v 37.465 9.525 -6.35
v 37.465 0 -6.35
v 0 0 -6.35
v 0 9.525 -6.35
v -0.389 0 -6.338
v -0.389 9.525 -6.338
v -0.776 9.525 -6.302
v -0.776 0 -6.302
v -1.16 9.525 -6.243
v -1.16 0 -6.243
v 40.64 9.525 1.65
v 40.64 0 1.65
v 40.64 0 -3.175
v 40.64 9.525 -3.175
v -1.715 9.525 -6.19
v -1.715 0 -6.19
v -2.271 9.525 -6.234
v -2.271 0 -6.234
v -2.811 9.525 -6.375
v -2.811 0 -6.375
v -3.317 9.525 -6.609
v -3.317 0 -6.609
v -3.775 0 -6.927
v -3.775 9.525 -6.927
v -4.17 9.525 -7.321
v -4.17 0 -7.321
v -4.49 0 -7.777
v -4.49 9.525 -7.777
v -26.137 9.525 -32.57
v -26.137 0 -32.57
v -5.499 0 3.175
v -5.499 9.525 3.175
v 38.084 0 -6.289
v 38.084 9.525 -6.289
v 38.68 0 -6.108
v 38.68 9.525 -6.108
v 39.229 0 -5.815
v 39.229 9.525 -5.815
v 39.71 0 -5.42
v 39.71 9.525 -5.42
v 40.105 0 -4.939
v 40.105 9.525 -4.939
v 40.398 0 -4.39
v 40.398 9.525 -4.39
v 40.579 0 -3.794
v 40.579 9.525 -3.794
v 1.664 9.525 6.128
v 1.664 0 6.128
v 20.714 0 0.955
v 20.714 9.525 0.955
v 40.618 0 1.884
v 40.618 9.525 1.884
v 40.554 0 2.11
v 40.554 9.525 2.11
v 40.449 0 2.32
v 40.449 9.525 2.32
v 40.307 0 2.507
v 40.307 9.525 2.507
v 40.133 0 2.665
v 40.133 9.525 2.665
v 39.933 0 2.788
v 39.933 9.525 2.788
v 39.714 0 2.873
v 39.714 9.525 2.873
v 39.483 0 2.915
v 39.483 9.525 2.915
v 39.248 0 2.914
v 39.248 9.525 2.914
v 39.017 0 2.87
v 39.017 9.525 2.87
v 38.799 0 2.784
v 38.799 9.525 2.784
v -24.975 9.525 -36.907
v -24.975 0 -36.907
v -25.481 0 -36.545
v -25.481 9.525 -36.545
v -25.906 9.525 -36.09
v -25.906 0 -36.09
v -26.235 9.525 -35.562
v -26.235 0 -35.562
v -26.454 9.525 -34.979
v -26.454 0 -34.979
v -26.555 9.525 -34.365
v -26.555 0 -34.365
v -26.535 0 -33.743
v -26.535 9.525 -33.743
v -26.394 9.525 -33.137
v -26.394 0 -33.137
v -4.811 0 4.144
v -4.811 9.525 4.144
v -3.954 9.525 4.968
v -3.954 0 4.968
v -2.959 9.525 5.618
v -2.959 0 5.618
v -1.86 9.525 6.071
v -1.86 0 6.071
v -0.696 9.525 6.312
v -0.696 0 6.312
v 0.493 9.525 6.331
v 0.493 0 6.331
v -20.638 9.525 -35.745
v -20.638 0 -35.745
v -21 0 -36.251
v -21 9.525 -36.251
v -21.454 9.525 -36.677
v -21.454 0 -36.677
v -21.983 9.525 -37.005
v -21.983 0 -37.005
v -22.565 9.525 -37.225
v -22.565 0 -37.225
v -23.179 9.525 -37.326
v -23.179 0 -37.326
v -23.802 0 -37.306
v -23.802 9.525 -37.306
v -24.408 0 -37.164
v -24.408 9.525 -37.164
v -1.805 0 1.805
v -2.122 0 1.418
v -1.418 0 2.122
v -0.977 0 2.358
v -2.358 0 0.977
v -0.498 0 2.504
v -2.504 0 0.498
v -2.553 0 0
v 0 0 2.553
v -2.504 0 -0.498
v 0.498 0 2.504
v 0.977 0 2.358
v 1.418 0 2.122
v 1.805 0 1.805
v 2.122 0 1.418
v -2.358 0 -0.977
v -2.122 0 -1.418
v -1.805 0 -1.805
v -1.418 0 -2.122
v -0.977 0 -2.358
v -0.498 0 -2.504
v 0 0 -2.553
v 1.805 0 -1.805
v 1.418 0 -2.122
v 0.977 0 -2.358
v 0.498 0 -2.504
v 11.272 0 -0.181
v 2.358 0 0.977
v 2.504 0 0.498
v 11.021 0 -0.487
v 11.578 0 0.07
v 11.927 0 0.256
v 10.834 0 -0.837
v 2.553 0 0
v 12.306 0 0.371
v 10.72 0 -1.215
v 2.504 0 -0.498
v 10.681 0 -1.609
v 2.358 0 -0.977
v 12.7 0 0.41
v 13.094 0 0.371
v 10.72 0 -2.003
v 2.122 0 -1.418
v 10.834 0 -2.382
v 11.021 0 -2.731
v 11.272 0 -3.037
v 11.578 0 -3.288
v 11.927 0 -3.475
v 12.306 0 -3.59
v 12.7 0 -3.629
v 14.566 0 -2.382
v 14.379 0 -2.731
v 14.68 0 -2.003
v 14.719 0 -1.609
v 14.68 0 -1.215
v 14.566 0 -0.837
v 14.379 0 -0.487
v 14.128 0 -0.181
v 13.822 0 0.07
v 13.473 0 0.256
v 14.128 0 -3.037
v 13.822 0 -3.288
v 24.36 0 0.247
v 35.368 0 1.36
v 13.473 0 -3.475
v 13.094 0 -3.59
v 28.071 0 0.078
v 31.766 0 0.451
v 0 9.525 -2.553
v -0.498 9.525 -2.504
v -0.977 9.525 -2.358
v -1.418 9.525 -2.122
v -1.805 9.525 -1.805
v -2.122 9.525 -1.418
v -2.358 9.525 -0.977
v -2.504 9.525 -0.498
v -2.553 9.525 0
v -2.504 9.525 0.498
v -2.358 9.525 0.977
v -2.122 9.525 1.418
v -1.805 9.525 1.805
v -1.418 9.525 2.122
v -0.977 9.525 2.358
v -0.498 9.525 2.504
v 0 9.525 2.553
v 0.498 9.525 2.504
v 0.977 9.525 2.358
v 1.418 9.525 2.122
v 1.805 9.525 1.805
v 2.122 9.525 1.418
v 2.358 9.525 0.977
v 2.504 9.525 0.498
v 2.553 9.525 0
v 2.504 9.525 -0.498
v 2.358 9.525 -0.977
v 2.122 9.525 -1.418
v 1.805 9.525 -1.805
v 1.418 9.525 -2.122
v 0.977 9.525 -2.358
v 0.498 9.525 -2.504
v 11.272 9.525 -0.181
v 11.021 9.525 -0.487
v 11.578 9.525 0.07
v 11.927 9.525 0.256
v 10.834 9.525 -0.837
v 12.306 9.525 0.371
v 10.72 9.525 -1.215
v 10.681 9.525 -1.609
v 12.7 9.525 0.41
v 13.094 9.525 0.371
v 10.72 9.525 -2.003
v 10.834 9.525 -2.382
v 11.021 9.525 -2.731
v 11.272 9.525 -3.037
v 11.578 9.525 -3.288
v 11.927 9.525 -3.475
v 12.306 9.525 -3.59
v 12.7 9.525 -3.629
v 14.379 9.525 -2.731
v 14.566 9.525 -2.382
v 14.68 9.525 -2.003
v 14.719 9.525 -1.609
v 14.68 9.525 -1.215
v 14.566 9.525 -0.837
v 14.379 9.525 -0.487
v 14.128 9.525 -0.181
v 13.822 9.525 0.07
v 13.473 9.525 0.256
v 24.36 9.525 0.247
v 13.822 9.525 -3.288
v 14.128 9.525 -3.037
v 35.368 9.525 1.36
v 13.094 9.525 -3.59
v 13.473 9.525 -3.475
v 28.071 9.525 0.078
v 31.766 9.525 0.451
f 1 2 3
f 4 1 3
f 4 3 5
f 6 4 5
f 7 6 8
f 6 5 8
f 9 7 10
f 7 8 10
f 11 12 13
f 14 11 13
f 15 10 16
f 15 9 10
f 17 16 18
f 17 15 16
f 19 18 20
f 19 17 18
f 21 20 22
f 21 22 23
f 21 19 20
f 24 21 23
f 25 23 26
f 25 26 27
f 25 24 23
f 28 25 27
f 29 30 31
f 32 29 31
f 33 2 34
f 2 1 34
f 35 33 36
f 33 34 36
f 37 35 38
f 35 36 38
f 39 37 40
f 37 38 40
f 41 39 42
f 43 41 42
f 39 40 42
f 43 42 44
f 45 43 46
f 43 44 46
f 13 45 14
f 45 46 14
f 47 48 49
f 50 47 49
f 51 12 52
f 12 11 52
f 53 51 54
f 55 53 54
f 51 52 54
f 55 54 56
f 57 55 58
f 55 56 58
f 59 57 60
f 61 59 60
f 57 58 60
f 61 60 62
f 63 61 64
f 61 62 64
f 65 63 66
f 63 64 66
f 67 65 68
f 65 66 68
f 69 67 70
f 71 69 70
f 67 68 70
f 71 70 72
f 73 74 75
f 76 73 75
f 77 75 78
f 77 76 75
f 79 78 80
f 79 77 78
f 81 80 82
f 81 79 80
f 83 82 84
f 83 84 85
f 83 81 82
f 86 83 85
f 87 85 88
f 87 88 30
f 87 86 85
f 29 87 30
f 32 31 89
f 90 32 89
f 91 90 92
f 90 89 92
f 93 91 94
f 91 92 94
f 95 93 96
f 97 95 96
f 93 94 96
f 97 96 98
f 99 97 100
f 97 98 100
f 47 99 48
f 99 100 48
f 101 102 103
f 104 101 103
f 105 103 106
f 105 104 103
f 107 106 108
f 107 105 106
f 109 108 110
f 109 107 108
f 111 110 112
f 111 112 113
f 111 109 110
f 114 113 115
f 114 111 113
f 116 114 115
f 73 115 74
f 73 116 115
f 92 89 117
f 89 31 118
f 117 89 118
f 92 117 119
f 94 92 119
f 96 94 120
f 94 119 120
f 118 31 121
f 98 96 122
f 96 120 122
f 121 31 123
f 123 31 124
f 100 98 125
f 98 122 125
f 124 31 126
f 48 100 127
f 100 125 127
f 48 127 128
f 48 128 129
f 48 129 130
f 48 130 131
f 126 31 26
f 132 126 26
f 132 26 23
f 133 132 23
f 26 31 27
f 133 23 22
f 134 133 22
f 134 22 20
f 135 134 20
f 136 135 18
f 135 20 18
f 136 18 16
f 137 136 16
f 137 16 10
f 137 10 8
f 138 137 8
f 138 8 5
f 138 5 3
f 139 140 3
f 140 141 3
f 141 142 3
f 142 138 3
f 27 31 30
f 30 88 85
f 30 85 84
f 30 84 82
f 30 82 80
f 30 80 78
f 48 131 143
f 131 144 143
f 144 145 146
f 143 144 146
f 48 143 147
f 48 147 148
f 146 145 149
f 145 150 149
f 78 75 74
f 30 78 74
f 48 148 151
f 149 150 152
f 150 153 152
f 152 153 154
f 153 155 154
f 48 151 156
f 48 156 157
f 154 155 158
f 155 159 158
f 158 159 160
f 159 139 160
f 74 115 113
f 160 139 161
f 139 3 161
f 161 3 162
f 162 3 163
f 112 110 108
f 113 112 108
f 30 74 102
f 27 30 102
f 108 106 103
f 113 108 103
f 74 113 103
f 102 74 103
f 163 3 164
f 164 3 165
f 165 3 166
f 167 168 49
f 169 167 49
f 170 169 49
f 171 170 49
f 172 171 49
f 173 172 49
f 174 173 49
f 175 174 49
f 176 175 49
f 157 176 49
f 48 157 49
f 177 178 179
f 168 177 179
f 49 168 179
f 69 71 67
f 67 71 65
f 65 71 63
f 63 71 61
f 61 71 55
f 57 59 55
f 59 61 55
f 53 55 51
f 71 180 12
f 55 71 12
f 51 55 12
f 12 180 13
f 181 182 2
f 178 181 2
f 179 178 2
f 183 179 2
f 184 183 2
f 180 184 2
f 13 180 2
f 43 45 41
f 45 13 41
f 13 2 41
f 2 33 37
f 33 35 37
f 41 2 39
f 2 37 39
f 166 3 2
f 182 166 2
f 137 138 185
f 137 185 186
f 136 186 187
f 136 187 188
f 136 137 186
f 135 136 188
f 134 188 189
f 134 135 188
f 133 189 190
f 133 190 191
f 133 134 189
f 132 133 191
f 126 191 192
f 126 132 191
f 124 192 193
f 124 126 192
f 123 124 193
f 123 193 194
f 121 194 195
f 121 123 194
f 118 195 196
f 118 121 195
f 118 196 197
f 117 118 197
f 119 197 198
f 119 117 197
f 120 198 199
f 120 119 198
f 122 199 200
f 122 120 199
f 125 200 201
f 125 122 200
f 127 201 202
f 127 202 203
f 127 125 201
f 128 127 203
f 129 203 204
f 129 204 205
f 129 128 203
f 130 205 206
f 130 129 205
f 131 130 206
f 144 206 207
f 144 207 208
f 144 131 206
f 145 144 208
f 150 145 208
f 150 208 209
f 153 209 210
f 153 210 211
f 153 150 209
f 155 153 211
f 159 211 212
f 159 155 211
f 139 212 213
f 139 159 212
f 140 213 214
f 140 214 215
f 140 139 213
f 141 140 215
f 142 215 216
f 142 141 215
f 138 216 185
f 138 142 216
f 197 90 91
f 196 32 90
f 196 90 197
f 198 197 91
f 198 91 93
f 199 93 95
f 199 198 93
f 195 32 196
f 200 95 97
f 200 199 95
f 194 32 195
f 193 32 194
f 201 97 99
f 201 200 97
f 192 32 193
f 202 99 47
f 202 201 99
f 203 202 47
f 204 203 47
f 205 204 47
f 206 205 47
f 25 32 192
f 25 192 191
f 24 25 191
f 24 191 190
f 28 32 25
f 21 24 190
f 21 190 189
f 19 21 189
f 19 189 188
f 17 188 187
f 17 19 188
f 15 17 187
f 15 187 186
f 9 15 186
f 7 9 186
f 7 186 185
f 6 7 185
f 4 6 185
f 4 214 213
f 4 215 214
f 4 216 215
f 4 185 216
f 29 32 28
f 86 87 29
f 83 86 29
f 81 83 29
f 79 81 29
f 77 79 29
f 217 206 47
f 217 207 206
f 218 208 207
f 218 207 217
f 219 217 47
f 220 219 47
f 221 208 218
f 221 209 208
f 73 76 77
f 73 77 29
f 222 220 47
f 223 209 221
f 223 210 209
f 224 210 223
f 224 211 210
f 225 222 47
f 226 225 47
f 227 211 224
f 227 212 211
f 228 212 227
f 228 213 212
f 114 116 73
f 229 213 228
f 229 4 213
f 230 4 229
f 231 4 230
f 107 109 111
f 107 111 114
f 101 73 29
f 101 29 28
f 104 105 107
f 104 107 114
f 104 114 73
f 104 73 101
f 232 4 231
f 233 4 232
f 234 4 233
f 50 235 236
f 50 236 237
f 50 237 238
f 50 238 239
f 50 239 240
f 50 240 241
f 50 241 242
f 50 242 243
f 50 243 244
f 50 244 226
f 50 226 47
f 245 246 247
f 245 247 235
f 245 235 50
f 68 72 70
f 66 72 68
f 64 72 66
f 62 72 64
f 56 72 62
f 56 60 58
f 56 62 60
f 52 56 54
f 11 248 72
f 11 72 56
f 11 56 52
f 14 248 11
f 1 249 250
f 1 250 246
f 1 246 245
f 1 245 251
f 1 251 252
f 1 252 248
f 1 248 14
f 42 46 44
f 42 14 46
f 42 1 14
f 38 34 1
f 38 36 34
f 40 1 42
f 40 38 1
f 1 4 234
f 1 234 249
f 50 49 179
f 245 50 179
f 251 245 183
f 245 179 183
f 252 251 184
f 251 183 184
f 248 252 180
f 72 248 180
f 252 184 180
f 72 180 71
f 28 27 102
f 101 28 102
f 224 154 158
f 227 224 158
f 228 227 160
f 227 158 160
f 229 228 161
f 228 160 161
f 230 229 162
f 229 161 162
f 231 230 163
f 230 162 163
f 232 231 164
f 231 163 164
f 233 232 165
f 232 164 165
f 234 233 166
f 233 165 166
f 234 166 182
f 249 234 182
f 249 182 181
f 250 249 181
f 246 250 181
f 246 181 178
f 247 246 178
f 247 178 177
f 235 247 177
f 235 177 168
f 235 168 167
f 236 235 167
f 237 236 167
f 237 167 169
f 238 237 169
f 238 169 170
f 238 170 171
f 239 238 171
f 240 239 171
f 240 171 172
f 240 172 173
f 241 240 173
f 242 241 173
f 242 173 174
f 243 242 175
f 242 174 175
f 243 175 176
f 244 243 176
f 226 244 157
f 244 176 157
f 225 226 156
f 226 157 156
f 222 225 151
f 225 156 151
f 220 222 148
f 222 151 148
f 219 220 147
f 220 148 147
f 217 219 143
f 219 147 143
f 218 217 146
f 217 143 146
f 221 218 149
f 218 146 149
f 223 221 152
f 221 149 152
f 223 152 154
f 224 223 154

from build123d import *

# Parameters (mm, degrees)
SKETCH1_R              = 6.35
SKETCH1_R_2            = 2.5527
BOSS_EXTRUDE1_DEPTH    = 9.525
FILLET1_R              = 3.175
FILLET2_R              = 1.27
F_10_32_TAPPED_HOLE1_D = 4.0386


with BuildPart() as part:
    # Sketch1 → Boss-Extrude1 (new body)
    # profile 1 of 3: a face of its own
    with BuildSketch(Plane(origin=(0, 0, 0), x_dir=(1, 0, 0), z_dir=(0, 1, 0))):
        Circle(SKETCH1_R)
        with Locations(Location((0, 0, 0), (0, 0, 90))):
            Circle(SKETCH1_R_2, mode=Mode.SUBTRACT)
    # profile 2 of 3: a face of its own
    with BuildSketch(Plane(origin=(0, 0, 0), x_dir=(1, 0, 0), z_dir=(0, 1, 0))):
        with BuildLine():
            Line((40.64, 6.35), (0, 6.35))
            ThreePointArc((0, 6.35), (4.490128061, 4.490128061), (6.35, 0))
            ThreePointArc((6.35, 0), (5.044240229, -3.857219271), (1.663971494, -6.128107283))
            Line((1.663971494, -6.128107283), (20.713971494, -0.955440505))
            ThreePointArc((20.713971494, -0.955440505), (30.971832611, -0.32456486), (40.64, -3.81))
            Line((40.64, -3.81), (40.64, 6.35))
        make_face()
    # profile 3 of 3: a face of its own
    with BuildSketch(Plane(origin=(0, 0, 0), x_dir=(1, 0, 0), z_dir=(0, 1, 0))):
        with BuildLine():
            ThreePointArc((-5.499261314, -3.175), (-6.133628997, 1.643500936), (-3.175, 5.499261314))
            Line((-3.175, 5.499261314), (-22.225, 38.494829198))
            Line((-22.225, 38.494829198), (-27.724261314, 35.319829198))
            Line((-27.724261314, 35.319829198), (-5.499261314, -3.175))
        make_face()
    extrude(amount=BOSS_EXTRUDE1_DEPTH)

    # Fillet1
    fillet1_edges = [part.edges().sort_by_distance(p)[0] for p in [
        (40.64, 4.7625, -6.35),
        (-3.175, 4.7625, -5.499261314),
        (-27.724261314, 4.7625, -35.319829198),
        (-22.225, 4.7625, -38.494829198),
    ]]
    fillet(fillet1_edges, radius=FILLET1_R - 0.0001)  # a hair under: the kernel refuses the full size

    # Fillet2
    fillet2_edges = [part.edges().sort_by_distance(p)[0] for p in [
        (40.64, 4.7625, 3.81),
    ]]
    fillet(fillet2_edges, radius=FILLET2_R)

    # #10-32 Tapped Hole1 (through all)
    with Locations(Plane(origin=(0, 9.525, 0), x_dir=(1, 0, 0), z_dir=(0, 1, 0))):
        with Locations((12.7, 1.609258642)):
            Hole(F_10_32_TAPPED_HOLE1_D / 2)


solid = part.part
